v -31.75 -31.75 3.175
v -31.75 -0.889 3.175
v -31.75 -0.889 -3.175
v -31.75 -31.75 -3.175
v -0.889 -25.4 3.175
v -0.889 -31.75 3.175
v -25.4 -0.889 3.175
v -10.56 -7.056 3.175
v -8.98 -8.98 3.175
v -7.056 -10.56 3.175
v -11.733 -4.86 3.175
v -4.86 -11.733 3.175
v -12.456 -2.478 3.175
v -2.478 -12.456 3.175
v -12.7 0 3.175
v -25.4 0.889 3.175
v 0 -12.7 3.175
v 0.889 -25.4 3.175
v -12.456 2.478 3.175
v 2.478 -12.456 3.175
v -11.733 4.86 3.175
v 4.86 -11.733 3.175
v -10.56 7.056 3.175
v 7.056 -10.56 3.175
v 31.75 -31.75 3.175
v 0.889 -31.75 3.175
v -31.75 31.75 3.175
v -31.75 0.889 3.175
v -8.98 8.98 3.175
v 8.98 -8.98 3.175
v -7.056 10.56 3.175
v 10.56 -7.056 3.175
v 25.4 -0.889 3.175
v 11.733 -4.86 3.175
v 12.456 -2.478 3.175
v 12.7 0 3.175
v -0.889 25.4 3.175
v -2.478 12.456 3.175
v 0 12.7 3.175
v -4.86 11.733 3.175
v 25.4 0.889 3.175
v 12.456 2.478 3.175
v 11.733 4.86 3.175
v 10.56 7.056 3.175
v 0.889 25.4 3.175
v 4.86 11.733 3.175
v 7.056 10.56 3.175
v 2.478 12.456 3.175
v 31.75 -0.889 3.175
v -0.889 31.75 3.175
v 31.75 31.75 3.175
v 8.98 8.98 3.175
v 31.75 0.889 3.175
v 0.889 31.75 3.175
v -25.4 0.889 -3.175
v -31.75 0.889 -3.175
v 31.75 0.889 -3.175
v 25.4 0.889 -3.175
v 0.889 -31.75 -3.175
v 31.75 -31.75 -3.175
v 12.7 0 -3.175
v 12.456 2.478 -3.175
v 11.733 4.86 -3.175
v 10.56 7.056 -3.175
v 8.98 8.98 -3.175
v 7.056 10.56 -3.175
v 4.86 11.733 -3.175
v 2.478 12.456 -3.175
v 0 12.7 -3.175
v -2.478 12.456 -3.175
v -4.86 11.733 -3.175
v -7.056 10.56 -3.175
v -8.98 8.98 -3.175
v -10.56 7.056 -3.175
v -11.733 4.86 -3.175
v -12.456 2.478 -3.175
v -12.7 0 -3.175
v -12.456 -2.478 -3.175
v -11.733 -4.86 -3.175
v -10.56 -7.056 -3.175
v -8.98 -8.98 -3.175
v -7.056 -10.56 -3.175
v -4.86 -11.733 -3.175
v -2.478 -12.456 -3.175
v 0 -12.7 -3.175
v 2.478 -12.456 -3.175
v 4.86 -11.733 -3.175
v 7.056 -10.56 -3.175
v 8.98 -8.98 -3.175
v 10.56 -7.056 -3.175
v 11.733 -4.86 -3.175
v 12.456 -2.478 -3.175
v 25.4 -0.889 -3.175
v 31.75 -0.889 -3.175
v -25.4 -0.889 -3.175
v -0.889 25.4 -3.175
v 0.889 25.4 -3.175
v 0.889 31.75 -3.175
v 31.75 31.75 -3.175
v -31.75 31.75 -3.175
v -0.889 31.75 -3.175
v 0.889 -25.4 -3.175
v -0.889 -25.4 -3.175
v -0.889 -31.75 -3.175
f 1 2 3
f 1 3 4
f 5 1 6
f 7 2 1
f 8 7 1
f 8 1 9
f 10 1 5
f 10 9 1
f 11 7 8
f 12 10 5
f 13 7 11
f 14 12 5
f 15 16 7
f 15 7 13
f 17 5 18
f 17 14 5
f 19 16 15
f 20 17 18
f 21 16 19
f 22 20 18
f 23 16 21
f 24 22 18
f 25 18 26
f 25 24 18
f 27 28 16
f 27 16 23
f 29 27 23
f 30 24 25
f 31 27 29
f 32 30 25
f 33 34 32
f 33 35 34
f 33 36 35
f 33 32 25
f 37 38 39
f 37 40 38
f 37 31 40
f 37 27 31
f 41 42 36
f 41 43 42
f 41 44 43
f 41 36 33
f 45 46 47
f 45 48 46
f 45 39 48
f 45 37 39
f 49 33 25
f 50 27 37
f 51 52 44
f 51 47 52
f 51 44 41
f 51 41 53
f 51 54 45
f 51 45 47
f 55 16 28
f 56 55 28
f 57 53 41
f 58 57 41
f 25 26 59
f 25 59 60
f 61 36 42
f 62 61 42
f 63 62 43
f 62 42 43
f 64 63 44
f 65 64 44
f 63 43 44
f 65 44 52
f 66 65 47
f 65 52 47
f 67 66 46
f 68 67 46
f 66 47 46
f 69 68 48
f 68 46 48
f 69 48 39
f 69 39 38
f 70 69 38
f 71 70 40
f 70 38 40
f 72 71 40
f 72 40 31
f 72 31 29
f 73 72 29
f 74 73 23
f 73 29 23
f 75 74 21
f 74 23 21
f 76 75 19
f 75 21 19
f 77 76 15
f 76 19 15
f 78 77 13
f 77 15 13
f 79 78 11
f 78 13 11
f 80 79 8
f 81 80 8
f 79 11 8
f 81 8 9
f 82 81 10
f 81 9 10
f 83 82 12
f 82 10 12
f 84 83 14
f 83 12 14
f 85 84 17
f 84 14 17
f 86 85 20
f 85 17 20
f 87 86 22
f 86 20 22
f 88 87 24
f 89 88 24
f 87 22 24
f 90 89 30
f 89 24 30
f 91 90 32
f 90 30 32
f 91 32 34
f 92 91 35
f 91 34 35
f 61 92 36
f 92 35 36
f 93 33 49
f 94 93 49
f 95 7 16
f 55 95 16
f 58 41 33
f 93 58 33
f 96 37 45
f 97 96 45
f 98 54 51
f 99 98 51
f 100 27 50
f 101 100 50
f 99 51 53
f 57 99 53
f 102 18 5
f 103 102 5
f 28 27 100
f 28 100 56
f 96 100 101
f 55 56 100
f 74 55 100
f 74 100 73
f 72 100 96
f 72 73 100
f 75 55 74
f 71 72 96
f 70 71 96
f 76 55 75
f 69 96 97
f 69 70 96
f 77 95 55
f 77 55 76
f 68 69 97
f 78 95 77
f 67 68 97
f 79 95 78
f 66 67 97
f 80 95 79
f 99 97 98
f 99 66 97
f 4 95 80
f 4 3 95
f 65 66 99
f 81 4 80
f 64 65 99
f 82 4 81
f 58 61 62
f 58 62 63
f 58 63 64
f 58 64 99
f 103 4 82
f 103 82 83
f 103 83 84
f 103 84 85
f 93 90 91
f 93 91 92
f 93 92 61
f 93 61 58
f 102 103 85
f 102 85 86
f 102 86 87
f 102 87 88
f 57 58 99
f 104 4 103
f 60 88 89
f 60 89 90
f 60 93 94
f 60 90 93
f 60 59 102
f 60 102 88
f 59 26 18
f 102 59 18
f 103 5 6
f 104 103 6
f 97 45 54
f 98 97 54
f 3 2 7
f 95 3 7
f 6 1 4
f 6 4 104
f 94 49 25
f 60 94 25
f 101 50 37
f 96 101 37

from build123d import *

# Parameters (mm, degrees)
F0_W      = 63.5
F0_H      = 63.5
F1_DEPTH  = 3.175
F1_FACE_W = 63.5
F1_FACE_H = 63.5
F2_DEPTH  = 3.175
F3_R      = 12.7
F4_DEPTH  = 6.35
F5_DEPTH  = 25.4
F6_DEPTH  = 25.4
F7_DEPTH  = 25.4
F8_DEPTH  = 25.4


with BuildPart() as f1:
    # F0 (on Top) → F1 (new body)
    with BuildSketch(Plane.XY):
        Rectangle(F0_W, F0_H)
    extrude(amount=F1_DEPTH)

    # F1_face (on face) → F2 (join)
    with BuildSketch(Plane(origin=(0, 0, 0), x_dir=(1, 0, 0), z_dir=(0, 0, -1))):
        Rectangle(F1_FACE_W, F1_FACE_H)
    extrude(amount=F2_DEPTH)

    # F3 (on face) → F4 (cut)
    with BuildSketch(Plane.XY.offset(3.175)):
        Circle(F3_R)
        Polygon((0.889, 31.75), (0, 31.75), (-0.889, 31.75), (-0.889, 25.4), (0.889, 25.4), align=None)
        Polygon((31.75, -0.889), (31.75, 0), (31.75, 0.889), (25.4, 0.889), (25.4, -0.889), align=None)
        Polygon((-0.889, -31.75), (0, -31.75), (0.889, -31.75), (0.889, -25.4), (-0.889, -25.4), align=None)
        Polygon((-31.75, 0.889), (-31.75, 0), (-31.75, -0.889), (-25.4, -0.889), (-25.4, 0.889), align=None)
    extrude(amount=-F4_DEPTH, mode=Mode.SUBTRACT)

    # F3 (on face) → F5 (cut)
    with BuildSketch(Plane.XY.offset(3.175)):
        Circle(F3_R)
        Polygon((0.889, 31.75), (0, 31.75), (-0.889, 31.75), (-0.889, 25.4), (0.889, 25.4), align=None)
        Polygon((31.75, -0.889), (31.75, 0), (31.75, 0.889), (25.4, 0.889), (25.4, -0.889), align=None)
        Polygon((-0.889, -31.75), (0, -31.75), (0.889, -31.75), (0.889, -25.4), (-0.889, -25.4), align=None)
        Polygon((-31.75, 0.889), (-31.75, 0), (-31.75, -0.889), (-25.4, -0.889), (-25.4, 0.889), align=None)
    extrude(amount=-F5_DEPTH, mode=Mode.SUBTRACT)

    # F3 (on face) → F6 (cut)
    with BuildSketch(Plane.XY.offset(3.175)):
        Circle(F3_R)
        Polygon((0.889, 31.75), (0, 31.75), (-0.889, 31.75), (-0.889, 25.4), (0.889, 25.4), align=None)
        Polygon((31.75, -0.889), (31.75, 0), (31.75, 0.889), (25.4, 0.889), (25.4, -0.889), align=None)
        Polygon((-0.889, -31.75), (0, -31.75), (0.889, -31.75), (0.889, -25.4), (-0.889, -25.4), align=None)
        Polygon((-31.75, 0.889), (-31.75, 0), (-31.75, -0.889), (-25.4, -0.889), (-25.4, 0.889), align=None)
    extrude(amount=-F6_DEPTH, mode=Mode.SUBTRACT)

    # F3 (on face) → F7 (cut)
    with BuildSketch(Plane.XY.offset(3.175)):
        Circle(F3_R)
        Polygon((0.889, 31.75), (0, 31.75), (-0.889, 31.75), (-0.889, 25.4), (0.889, 25.4), align=None)
        Polygon((31.75, -0.889), (31.75, 0), (31.75, 0.889), (25.4, 0.889), (25.4, -0.889), align=None)
        Polygon((-0.889, -31.75), (0, -31.75), (0.889, -31.75), (0.889, -25.4), (-0.889, -25.4), align=None)
        Polygon((-31.75, 0.889), (-31.75, 0), (-31.75, -0.889), (-25.4, -0.889), (-25.4, 0.889), align=None)
    extrude(amount=-F7_DEPTH, mode=Mode.SUBTRACT)

    # F3 (on face) → F8 (cut)
    with BuildSketch(Plane.XY.offset(3.175)):
        Circle(F3_R)
        Polygon((0.889, 31.75), (0, 31.75), (-0.889, 31.75), (-0.889, 25.4), (0.889, 25.4), align=None)
        Polygon((31.75, -0.889), (31.75, 0), (31.75, 0.889), (25.4, 0.889), (25.4, -0.889), align=None)
        Polygon((-0.889, -31.75), (0, -31.75), (0.889, -31.75), (0.889, -25.4), (-0.889, -25.4), align=None)
        Polygon((-31.75, 0.889), (-31.75, 0), (-31.75, -0.889), (-25.4, -0.889), (-25.4, 0.889), align=None)
    extrude(amount=-F8_DEPTH, mode=Mode.SUBTRACT)


solid = f1.part
